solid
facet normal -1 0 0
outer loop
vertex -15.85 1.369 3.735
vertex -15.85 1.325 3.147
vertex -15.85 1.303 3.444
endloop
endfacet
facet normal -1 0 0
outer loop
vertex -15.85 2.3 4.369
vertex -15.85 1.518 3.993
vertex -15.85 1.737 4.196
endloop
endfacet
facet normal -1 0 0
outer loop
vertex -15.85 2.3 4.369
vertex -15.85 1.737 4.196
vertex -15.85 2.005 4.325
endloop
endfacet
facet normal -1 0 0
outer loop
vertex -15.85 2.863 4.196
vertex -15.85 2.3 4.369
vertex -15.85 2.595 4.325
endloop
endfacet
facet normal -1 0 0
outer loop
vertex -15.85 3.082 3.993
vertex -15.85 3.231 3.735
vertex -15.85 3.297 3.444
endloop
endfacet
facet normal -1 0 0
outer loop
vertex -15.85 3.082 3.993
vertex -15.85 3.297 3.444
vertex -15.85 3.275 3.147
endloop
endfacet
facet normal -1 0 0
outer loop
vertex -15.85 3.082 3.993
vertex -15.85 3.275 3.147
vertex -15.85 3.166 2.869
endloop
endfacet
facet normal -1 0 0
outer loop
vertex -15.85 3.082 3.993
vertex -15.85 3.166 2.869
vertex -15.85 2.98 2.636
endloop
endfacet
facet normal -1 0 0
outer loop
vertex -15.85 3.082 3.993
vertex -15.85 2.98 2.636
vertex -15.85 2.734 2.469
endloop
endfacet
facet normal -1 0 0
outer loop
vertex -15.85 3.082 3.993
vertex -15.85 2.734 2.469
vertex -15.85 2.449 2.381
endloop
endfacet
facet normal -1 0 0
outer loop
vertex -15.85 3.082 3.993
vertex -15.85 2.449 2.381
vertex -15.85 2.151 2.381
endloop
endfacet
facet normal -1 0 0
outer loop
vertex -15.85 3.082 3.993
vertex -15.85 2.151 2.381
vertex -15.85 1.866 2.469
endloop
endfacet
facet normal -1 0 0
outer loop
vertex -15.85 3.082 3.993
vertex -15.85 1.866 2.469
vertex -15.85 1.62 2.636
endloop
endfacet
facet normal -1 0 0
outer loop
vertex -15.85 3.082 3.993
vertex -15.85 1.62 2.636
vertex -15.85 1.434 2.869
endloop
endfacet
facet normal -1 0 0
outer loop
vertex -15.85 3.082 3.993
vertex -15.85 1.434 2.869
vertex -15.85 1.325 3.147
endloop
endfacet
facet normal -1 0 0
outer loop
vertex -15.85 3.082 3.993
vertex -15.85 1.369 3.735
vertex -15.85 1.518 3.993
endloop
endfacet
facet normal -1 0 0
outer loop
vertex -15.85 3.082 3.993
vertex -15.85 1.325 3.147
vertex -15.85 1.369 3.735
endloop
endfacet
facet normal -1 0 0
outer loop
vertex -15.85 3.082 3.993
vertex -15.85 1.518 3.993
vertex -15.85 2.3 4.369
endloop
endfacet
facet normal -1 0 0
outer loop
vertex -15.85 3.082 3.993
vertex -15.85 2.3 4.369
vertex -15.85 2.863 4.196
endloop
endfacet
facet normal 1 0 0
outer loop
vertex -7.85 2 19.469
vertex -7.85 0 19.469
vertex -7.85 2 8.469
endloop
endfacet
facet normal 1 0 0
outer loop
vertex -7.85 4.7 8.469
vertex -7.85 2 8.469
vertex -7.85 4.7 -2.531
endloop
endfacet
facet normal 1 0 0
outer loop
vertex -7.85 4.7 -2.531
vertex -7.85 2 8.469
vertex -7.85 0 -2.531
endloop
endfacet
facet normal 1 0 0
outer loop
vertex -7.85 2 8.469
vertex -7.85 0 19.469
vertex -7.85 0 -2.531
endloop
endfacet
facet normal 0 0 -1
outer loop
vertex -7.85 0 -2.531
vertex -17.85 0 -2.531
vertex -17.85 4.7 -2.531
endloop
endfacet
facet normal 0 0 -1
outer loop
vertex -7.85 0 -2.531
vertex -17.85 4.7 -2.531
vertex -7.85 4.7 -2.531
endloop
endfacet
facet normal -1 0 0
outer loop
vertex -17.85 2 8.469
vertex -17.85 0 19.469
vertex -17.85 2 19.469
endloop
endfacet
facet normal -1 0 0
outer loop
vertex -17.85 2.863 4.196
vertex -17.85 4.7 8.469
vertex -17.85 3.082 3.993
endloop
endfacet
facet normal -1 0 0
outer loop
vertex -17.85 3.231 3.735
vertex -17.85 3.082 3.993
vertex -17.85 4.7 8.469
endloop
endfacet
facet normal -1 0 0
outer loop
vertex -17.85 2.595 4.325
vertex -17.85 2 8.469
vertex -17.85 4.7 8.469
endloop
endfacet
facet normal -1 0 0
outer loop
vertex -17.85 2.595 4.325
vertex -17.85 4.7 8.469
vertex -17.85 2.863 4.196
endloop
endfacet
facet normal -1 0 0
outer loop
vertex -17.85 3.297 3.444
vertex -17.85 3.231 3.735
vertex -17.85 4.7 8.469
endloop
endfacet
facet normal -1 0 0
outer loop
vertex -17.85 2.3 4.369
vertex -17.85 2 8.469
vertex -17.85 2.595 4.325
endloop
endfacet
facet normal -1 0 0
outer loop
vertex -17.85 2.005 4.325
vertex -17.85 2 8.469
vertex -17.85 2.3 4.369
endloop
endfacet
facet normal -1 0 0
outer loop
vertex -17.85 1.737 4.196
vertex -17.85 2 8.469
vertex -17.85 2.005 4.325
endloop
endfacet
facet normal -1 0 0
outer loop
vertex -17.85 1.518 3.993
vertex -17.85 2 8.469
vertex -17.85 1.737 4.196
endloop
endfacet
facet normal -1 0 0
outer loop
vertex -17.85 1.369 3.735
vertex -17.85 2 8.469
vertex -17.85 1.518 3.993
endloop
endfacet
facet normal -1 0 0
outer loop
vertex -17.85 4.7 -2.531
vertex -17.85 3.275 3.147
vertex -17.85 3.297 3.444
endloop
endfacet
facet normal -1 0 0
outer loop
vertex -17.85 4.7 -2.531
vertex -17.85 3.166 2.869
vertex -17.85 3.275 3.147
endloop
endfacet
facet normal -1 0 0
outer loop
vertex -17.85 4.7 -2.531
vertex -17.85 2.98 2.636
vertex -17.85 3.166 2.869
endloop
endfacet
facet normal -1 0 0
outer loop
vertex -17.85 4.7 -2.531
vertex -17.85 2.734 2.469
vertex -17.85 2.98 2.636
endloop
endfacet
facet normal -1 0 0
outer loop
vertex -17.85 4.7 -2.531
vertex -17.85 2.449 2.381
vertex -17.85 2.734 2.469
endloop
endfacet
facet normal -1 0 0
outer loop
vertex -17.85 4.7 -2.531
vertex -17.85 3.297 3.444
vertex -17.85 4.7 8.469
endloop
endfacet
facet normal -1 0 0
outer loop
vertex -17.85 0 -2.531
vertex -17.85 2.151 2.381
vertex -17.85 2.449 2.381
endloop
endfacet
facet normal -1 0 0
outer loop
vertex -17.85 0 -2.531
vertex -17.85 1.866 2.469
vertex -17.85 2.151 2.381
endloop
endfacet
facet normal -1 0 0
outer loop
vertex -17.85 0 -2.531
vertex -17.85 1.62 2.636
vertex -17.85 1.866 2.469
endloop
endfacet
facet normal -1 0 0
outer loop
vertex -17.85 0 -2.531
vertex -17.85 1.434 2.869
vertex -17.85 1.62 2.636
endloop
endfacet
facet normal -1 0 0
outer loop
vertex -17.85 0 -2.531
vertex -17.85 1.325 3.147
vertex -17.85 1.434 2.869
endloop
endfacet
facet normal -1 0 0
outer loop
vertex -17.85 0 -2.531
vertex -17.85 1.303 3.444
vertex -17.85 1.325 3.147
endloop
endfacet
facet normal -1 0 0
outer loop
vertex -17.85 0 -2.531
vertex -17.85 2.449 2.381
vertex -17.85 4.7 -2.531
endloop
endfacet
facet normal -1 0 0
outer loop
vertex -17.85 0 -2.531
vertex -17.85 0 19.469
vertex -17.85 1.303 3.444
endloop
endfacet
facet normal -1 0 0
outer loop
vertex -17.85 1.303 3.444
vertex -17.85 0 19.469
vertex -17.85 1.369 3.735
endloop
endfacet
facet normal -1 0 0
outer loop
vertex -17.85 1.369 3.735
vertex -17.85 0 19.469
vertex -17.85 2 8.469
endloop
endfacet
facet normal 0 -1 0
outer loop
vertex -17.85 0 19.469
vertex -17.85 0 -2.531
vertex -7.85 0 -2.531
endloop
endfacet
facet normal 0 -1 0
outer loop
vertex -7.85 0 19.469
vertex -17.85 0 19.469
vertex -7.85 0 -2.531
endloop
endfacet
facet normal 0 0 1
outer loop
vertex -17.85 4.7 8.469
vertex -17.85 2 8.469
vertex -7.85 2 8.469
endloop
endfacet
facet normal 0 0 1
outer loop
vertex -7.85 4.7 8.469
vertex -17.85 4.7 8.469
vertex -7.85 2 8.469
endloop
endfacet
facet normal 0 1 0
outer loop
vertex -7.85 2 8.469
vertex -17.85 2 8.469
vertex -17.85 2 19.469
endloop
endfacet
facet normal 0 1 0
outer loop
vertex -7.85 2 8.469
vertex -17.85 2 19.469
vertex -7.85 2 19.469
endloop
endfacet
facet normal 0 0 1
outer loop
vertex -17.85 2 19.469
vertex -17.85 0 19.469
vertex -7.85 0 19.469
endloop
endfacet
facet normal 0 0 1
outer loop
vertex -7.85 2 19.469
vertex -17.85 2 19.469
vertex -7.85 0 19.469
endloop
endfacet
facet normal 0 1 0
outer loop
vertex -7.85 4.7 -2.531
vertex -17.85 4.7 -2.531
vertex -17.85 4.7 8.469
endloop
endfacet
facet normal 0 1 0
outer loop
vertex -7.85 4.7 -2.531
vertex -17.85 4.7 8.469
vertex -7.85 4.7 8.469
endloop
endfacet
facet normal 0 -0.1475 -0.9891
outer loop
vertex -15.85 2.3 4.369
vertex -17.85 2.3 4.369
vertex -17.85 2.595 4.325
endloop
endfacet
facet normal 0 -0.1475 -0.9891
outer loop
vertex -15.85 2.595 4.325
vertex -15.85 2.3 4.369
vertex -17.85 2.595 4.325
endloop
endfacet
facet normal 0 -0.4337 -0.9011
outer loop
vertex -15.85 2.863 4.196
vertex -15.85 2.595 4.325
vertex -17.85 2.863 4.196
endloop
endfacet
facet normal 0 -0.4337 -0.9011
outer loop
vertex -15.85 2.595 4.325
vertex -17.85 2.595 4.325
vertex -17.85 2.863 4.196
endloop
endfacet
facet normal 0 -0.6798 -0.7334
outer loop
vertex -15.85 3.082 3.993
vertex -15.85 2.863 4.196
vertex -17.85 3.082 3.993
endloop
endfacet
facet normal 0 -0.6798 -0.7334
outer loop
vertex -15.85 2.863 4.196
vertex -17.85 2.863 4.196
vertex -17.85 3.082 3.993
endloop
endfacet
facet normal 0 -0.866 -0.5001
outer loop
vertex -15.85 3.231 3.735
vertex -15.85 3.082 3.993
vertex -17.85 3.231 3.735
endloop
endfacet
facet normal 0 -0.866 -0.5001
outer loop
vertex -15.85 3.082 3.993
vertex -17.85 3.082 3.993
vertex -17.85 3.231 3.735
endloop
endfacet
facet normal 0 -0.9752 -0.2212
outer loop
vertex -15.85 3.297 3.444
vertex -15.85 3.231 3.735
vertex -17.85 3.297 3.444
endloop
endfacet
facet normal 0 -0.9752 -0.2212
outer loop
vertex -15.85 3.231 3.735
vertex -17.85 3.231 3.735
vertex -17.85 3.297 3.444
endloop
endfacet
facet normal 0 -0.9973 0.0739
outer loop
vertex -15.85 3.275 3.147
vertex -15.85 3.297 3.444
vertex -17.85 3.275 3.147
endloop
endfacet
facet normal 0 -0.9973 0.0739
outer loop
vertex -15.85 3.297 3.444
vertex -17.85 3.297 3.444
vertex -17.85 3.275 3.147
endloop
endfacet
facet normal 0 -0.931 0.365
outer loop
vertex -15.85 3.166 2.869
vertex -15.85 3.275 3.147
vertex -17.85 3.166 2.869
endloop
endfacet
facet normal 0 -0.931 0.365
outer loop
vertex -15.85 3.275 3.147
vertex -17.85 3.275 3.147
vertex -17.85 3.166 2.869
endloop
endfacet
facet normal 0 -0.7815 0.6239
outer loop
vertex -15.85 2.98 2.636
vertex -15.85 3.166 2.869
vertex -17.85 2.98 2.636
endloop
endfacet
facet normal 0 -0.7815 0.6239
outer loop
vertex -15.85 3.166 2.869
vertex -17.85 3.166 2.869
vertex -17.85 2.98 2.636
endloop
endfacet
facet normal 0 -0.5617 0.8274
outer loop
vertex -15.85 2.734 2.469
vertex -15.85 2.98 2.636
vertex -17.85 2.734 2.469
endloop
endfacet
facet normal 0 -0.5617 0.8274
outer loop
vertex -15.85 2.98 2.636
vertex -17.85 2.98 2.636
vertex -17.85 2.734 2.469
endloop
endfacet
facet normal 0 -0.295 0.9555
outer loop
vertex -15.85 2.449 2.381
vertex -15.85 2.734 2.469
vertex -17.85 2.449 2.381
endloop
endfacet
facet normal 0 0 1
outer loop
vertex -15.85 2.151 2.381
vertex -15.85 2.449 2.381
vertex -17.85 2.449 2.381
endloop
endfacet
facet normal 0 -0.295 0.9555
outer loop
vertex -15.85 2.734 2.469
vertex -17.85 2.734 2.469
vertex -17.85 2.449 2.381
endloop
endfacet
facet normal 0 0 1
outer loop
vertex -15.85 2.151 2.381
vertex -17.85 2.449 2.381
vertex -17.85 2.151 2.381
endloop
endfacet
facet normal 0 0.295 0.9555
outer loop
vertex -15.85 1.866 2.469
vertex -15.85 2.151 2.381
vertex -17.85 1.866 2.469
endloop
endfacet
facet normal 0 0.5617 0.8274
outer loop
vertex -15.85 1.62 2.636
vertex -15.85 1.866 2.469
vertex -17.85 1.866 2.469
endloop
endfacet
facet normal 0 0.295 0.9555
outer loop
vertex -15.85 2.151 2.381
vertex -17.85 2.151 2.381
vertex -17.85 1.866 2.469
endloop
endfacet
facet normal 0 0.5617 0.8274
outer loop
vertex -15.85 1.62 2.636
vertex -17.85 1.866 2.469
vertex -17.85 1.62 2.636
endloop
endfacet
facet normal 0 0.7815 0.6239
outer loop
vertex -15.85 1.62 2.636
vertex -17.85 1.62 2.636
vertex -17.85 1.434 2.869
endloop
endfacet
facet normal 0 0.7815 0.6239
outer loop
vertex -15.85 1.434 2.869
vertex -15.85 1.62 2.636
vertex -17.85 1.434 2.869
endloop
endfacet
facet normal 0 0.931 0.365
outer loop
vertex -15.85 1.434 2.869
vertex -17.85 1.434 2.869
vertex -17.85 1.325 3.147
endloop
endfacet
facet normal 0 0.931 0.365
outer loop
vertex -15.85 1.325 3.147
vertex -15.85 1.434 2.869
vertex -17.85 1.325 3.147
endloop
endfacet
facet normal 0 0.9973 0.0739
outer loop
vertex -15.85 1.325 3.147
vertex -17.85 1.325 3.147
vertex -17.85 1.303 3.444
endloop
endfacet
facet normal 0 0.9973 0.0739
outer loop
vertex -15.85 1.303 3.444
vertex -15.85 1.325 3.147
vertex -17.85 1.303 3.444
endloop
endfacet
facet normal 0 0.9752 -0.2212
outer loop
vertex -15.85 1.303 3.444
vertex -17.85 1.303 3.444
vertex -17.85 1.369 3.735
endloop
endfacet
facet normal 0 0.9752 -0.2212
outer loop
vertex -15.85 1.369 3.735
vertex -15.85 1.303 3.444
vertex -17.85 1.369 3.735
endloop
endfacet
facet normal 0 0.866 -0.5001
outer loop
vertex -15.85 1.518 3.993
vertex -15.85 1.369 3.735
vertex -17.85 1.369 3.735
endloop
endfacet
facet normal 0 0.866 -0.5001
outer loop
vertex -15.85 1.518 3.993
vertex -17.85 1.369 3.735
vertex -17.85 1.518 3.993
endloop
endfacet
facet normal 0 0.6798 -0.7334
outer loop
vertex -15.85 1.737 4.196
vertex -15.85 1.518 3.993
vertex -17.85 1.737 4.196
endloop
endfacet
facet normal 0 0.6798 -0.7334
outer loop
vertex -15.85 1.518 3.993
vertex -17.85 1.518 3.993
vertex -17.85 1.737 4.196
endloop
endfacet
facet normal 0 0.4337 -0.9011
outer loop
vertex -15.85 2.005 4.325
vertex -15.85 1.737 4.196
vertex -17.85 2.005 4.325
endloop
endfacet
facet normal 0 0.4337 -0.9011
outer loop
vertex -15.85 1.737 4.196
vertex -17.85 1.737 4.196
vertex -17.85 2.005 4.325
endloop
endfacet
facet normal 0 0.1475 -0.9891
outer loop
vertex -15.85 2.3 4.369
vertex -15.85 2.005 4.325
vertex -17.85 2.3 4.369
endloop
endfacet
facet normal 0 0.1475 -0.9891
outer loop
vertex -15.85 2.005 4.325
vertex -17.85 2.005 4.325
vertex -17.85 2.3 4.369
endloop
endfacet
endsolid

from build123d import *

# Parameters (mm, degrees)
SKETCH3_W           = 10
SKETCH3_H           = 22
BOSS_EXTRUDE1_DEPTH = 2
SKETCH4_W           = 10
SKETCH4_H           = 11
BOSS_EXTRUDE2_DEPTH = 2.7
SKETCH5_R           = 1
CUT_EXTRUDE1_DEPTH  = 2


with BuildPart() as part:
    # Sketch3 → Boss-Extrude1 (new body)
    with BuildSketch(Plane(origin=(0, 0, 0), x_dir=(1, 0, 0), z_dir=(0, 1, 0))):
        with Locations((-12.849765258, -8.469483568)):
            Rectangle(SKETCH3_W, SKETCH3_H)
    extrude(amount=BOSS_EXTRUDE1_DEPTH)

    # Sketch4 → Boss-Extrude2 (add)
    with BuildSketch(Plane(origin=(0, 2, 0), x_dir=(1, 0, 0), z_dir=(0, 1, 0))):
        with Locations((-12.849765258, -2.969483568)):
            Rectangle(SKETCH4_W, SKETCH4_H)
    extrude(amount=BOSS_EXTRUDE2_DEPTH)

    # Sketch5 → Cut-Extrude1 (cut)
    with BuildSketch(Plane.ZY.offset(17.849765258)):
        with Locations((3.369483568, 2.3)):
            Circle(SKETCH5_R)
    extrude(amount=-CUT_EXTRUDE1_DEPTH, mode=Mode.SUBTRACT)


solid = part.part
